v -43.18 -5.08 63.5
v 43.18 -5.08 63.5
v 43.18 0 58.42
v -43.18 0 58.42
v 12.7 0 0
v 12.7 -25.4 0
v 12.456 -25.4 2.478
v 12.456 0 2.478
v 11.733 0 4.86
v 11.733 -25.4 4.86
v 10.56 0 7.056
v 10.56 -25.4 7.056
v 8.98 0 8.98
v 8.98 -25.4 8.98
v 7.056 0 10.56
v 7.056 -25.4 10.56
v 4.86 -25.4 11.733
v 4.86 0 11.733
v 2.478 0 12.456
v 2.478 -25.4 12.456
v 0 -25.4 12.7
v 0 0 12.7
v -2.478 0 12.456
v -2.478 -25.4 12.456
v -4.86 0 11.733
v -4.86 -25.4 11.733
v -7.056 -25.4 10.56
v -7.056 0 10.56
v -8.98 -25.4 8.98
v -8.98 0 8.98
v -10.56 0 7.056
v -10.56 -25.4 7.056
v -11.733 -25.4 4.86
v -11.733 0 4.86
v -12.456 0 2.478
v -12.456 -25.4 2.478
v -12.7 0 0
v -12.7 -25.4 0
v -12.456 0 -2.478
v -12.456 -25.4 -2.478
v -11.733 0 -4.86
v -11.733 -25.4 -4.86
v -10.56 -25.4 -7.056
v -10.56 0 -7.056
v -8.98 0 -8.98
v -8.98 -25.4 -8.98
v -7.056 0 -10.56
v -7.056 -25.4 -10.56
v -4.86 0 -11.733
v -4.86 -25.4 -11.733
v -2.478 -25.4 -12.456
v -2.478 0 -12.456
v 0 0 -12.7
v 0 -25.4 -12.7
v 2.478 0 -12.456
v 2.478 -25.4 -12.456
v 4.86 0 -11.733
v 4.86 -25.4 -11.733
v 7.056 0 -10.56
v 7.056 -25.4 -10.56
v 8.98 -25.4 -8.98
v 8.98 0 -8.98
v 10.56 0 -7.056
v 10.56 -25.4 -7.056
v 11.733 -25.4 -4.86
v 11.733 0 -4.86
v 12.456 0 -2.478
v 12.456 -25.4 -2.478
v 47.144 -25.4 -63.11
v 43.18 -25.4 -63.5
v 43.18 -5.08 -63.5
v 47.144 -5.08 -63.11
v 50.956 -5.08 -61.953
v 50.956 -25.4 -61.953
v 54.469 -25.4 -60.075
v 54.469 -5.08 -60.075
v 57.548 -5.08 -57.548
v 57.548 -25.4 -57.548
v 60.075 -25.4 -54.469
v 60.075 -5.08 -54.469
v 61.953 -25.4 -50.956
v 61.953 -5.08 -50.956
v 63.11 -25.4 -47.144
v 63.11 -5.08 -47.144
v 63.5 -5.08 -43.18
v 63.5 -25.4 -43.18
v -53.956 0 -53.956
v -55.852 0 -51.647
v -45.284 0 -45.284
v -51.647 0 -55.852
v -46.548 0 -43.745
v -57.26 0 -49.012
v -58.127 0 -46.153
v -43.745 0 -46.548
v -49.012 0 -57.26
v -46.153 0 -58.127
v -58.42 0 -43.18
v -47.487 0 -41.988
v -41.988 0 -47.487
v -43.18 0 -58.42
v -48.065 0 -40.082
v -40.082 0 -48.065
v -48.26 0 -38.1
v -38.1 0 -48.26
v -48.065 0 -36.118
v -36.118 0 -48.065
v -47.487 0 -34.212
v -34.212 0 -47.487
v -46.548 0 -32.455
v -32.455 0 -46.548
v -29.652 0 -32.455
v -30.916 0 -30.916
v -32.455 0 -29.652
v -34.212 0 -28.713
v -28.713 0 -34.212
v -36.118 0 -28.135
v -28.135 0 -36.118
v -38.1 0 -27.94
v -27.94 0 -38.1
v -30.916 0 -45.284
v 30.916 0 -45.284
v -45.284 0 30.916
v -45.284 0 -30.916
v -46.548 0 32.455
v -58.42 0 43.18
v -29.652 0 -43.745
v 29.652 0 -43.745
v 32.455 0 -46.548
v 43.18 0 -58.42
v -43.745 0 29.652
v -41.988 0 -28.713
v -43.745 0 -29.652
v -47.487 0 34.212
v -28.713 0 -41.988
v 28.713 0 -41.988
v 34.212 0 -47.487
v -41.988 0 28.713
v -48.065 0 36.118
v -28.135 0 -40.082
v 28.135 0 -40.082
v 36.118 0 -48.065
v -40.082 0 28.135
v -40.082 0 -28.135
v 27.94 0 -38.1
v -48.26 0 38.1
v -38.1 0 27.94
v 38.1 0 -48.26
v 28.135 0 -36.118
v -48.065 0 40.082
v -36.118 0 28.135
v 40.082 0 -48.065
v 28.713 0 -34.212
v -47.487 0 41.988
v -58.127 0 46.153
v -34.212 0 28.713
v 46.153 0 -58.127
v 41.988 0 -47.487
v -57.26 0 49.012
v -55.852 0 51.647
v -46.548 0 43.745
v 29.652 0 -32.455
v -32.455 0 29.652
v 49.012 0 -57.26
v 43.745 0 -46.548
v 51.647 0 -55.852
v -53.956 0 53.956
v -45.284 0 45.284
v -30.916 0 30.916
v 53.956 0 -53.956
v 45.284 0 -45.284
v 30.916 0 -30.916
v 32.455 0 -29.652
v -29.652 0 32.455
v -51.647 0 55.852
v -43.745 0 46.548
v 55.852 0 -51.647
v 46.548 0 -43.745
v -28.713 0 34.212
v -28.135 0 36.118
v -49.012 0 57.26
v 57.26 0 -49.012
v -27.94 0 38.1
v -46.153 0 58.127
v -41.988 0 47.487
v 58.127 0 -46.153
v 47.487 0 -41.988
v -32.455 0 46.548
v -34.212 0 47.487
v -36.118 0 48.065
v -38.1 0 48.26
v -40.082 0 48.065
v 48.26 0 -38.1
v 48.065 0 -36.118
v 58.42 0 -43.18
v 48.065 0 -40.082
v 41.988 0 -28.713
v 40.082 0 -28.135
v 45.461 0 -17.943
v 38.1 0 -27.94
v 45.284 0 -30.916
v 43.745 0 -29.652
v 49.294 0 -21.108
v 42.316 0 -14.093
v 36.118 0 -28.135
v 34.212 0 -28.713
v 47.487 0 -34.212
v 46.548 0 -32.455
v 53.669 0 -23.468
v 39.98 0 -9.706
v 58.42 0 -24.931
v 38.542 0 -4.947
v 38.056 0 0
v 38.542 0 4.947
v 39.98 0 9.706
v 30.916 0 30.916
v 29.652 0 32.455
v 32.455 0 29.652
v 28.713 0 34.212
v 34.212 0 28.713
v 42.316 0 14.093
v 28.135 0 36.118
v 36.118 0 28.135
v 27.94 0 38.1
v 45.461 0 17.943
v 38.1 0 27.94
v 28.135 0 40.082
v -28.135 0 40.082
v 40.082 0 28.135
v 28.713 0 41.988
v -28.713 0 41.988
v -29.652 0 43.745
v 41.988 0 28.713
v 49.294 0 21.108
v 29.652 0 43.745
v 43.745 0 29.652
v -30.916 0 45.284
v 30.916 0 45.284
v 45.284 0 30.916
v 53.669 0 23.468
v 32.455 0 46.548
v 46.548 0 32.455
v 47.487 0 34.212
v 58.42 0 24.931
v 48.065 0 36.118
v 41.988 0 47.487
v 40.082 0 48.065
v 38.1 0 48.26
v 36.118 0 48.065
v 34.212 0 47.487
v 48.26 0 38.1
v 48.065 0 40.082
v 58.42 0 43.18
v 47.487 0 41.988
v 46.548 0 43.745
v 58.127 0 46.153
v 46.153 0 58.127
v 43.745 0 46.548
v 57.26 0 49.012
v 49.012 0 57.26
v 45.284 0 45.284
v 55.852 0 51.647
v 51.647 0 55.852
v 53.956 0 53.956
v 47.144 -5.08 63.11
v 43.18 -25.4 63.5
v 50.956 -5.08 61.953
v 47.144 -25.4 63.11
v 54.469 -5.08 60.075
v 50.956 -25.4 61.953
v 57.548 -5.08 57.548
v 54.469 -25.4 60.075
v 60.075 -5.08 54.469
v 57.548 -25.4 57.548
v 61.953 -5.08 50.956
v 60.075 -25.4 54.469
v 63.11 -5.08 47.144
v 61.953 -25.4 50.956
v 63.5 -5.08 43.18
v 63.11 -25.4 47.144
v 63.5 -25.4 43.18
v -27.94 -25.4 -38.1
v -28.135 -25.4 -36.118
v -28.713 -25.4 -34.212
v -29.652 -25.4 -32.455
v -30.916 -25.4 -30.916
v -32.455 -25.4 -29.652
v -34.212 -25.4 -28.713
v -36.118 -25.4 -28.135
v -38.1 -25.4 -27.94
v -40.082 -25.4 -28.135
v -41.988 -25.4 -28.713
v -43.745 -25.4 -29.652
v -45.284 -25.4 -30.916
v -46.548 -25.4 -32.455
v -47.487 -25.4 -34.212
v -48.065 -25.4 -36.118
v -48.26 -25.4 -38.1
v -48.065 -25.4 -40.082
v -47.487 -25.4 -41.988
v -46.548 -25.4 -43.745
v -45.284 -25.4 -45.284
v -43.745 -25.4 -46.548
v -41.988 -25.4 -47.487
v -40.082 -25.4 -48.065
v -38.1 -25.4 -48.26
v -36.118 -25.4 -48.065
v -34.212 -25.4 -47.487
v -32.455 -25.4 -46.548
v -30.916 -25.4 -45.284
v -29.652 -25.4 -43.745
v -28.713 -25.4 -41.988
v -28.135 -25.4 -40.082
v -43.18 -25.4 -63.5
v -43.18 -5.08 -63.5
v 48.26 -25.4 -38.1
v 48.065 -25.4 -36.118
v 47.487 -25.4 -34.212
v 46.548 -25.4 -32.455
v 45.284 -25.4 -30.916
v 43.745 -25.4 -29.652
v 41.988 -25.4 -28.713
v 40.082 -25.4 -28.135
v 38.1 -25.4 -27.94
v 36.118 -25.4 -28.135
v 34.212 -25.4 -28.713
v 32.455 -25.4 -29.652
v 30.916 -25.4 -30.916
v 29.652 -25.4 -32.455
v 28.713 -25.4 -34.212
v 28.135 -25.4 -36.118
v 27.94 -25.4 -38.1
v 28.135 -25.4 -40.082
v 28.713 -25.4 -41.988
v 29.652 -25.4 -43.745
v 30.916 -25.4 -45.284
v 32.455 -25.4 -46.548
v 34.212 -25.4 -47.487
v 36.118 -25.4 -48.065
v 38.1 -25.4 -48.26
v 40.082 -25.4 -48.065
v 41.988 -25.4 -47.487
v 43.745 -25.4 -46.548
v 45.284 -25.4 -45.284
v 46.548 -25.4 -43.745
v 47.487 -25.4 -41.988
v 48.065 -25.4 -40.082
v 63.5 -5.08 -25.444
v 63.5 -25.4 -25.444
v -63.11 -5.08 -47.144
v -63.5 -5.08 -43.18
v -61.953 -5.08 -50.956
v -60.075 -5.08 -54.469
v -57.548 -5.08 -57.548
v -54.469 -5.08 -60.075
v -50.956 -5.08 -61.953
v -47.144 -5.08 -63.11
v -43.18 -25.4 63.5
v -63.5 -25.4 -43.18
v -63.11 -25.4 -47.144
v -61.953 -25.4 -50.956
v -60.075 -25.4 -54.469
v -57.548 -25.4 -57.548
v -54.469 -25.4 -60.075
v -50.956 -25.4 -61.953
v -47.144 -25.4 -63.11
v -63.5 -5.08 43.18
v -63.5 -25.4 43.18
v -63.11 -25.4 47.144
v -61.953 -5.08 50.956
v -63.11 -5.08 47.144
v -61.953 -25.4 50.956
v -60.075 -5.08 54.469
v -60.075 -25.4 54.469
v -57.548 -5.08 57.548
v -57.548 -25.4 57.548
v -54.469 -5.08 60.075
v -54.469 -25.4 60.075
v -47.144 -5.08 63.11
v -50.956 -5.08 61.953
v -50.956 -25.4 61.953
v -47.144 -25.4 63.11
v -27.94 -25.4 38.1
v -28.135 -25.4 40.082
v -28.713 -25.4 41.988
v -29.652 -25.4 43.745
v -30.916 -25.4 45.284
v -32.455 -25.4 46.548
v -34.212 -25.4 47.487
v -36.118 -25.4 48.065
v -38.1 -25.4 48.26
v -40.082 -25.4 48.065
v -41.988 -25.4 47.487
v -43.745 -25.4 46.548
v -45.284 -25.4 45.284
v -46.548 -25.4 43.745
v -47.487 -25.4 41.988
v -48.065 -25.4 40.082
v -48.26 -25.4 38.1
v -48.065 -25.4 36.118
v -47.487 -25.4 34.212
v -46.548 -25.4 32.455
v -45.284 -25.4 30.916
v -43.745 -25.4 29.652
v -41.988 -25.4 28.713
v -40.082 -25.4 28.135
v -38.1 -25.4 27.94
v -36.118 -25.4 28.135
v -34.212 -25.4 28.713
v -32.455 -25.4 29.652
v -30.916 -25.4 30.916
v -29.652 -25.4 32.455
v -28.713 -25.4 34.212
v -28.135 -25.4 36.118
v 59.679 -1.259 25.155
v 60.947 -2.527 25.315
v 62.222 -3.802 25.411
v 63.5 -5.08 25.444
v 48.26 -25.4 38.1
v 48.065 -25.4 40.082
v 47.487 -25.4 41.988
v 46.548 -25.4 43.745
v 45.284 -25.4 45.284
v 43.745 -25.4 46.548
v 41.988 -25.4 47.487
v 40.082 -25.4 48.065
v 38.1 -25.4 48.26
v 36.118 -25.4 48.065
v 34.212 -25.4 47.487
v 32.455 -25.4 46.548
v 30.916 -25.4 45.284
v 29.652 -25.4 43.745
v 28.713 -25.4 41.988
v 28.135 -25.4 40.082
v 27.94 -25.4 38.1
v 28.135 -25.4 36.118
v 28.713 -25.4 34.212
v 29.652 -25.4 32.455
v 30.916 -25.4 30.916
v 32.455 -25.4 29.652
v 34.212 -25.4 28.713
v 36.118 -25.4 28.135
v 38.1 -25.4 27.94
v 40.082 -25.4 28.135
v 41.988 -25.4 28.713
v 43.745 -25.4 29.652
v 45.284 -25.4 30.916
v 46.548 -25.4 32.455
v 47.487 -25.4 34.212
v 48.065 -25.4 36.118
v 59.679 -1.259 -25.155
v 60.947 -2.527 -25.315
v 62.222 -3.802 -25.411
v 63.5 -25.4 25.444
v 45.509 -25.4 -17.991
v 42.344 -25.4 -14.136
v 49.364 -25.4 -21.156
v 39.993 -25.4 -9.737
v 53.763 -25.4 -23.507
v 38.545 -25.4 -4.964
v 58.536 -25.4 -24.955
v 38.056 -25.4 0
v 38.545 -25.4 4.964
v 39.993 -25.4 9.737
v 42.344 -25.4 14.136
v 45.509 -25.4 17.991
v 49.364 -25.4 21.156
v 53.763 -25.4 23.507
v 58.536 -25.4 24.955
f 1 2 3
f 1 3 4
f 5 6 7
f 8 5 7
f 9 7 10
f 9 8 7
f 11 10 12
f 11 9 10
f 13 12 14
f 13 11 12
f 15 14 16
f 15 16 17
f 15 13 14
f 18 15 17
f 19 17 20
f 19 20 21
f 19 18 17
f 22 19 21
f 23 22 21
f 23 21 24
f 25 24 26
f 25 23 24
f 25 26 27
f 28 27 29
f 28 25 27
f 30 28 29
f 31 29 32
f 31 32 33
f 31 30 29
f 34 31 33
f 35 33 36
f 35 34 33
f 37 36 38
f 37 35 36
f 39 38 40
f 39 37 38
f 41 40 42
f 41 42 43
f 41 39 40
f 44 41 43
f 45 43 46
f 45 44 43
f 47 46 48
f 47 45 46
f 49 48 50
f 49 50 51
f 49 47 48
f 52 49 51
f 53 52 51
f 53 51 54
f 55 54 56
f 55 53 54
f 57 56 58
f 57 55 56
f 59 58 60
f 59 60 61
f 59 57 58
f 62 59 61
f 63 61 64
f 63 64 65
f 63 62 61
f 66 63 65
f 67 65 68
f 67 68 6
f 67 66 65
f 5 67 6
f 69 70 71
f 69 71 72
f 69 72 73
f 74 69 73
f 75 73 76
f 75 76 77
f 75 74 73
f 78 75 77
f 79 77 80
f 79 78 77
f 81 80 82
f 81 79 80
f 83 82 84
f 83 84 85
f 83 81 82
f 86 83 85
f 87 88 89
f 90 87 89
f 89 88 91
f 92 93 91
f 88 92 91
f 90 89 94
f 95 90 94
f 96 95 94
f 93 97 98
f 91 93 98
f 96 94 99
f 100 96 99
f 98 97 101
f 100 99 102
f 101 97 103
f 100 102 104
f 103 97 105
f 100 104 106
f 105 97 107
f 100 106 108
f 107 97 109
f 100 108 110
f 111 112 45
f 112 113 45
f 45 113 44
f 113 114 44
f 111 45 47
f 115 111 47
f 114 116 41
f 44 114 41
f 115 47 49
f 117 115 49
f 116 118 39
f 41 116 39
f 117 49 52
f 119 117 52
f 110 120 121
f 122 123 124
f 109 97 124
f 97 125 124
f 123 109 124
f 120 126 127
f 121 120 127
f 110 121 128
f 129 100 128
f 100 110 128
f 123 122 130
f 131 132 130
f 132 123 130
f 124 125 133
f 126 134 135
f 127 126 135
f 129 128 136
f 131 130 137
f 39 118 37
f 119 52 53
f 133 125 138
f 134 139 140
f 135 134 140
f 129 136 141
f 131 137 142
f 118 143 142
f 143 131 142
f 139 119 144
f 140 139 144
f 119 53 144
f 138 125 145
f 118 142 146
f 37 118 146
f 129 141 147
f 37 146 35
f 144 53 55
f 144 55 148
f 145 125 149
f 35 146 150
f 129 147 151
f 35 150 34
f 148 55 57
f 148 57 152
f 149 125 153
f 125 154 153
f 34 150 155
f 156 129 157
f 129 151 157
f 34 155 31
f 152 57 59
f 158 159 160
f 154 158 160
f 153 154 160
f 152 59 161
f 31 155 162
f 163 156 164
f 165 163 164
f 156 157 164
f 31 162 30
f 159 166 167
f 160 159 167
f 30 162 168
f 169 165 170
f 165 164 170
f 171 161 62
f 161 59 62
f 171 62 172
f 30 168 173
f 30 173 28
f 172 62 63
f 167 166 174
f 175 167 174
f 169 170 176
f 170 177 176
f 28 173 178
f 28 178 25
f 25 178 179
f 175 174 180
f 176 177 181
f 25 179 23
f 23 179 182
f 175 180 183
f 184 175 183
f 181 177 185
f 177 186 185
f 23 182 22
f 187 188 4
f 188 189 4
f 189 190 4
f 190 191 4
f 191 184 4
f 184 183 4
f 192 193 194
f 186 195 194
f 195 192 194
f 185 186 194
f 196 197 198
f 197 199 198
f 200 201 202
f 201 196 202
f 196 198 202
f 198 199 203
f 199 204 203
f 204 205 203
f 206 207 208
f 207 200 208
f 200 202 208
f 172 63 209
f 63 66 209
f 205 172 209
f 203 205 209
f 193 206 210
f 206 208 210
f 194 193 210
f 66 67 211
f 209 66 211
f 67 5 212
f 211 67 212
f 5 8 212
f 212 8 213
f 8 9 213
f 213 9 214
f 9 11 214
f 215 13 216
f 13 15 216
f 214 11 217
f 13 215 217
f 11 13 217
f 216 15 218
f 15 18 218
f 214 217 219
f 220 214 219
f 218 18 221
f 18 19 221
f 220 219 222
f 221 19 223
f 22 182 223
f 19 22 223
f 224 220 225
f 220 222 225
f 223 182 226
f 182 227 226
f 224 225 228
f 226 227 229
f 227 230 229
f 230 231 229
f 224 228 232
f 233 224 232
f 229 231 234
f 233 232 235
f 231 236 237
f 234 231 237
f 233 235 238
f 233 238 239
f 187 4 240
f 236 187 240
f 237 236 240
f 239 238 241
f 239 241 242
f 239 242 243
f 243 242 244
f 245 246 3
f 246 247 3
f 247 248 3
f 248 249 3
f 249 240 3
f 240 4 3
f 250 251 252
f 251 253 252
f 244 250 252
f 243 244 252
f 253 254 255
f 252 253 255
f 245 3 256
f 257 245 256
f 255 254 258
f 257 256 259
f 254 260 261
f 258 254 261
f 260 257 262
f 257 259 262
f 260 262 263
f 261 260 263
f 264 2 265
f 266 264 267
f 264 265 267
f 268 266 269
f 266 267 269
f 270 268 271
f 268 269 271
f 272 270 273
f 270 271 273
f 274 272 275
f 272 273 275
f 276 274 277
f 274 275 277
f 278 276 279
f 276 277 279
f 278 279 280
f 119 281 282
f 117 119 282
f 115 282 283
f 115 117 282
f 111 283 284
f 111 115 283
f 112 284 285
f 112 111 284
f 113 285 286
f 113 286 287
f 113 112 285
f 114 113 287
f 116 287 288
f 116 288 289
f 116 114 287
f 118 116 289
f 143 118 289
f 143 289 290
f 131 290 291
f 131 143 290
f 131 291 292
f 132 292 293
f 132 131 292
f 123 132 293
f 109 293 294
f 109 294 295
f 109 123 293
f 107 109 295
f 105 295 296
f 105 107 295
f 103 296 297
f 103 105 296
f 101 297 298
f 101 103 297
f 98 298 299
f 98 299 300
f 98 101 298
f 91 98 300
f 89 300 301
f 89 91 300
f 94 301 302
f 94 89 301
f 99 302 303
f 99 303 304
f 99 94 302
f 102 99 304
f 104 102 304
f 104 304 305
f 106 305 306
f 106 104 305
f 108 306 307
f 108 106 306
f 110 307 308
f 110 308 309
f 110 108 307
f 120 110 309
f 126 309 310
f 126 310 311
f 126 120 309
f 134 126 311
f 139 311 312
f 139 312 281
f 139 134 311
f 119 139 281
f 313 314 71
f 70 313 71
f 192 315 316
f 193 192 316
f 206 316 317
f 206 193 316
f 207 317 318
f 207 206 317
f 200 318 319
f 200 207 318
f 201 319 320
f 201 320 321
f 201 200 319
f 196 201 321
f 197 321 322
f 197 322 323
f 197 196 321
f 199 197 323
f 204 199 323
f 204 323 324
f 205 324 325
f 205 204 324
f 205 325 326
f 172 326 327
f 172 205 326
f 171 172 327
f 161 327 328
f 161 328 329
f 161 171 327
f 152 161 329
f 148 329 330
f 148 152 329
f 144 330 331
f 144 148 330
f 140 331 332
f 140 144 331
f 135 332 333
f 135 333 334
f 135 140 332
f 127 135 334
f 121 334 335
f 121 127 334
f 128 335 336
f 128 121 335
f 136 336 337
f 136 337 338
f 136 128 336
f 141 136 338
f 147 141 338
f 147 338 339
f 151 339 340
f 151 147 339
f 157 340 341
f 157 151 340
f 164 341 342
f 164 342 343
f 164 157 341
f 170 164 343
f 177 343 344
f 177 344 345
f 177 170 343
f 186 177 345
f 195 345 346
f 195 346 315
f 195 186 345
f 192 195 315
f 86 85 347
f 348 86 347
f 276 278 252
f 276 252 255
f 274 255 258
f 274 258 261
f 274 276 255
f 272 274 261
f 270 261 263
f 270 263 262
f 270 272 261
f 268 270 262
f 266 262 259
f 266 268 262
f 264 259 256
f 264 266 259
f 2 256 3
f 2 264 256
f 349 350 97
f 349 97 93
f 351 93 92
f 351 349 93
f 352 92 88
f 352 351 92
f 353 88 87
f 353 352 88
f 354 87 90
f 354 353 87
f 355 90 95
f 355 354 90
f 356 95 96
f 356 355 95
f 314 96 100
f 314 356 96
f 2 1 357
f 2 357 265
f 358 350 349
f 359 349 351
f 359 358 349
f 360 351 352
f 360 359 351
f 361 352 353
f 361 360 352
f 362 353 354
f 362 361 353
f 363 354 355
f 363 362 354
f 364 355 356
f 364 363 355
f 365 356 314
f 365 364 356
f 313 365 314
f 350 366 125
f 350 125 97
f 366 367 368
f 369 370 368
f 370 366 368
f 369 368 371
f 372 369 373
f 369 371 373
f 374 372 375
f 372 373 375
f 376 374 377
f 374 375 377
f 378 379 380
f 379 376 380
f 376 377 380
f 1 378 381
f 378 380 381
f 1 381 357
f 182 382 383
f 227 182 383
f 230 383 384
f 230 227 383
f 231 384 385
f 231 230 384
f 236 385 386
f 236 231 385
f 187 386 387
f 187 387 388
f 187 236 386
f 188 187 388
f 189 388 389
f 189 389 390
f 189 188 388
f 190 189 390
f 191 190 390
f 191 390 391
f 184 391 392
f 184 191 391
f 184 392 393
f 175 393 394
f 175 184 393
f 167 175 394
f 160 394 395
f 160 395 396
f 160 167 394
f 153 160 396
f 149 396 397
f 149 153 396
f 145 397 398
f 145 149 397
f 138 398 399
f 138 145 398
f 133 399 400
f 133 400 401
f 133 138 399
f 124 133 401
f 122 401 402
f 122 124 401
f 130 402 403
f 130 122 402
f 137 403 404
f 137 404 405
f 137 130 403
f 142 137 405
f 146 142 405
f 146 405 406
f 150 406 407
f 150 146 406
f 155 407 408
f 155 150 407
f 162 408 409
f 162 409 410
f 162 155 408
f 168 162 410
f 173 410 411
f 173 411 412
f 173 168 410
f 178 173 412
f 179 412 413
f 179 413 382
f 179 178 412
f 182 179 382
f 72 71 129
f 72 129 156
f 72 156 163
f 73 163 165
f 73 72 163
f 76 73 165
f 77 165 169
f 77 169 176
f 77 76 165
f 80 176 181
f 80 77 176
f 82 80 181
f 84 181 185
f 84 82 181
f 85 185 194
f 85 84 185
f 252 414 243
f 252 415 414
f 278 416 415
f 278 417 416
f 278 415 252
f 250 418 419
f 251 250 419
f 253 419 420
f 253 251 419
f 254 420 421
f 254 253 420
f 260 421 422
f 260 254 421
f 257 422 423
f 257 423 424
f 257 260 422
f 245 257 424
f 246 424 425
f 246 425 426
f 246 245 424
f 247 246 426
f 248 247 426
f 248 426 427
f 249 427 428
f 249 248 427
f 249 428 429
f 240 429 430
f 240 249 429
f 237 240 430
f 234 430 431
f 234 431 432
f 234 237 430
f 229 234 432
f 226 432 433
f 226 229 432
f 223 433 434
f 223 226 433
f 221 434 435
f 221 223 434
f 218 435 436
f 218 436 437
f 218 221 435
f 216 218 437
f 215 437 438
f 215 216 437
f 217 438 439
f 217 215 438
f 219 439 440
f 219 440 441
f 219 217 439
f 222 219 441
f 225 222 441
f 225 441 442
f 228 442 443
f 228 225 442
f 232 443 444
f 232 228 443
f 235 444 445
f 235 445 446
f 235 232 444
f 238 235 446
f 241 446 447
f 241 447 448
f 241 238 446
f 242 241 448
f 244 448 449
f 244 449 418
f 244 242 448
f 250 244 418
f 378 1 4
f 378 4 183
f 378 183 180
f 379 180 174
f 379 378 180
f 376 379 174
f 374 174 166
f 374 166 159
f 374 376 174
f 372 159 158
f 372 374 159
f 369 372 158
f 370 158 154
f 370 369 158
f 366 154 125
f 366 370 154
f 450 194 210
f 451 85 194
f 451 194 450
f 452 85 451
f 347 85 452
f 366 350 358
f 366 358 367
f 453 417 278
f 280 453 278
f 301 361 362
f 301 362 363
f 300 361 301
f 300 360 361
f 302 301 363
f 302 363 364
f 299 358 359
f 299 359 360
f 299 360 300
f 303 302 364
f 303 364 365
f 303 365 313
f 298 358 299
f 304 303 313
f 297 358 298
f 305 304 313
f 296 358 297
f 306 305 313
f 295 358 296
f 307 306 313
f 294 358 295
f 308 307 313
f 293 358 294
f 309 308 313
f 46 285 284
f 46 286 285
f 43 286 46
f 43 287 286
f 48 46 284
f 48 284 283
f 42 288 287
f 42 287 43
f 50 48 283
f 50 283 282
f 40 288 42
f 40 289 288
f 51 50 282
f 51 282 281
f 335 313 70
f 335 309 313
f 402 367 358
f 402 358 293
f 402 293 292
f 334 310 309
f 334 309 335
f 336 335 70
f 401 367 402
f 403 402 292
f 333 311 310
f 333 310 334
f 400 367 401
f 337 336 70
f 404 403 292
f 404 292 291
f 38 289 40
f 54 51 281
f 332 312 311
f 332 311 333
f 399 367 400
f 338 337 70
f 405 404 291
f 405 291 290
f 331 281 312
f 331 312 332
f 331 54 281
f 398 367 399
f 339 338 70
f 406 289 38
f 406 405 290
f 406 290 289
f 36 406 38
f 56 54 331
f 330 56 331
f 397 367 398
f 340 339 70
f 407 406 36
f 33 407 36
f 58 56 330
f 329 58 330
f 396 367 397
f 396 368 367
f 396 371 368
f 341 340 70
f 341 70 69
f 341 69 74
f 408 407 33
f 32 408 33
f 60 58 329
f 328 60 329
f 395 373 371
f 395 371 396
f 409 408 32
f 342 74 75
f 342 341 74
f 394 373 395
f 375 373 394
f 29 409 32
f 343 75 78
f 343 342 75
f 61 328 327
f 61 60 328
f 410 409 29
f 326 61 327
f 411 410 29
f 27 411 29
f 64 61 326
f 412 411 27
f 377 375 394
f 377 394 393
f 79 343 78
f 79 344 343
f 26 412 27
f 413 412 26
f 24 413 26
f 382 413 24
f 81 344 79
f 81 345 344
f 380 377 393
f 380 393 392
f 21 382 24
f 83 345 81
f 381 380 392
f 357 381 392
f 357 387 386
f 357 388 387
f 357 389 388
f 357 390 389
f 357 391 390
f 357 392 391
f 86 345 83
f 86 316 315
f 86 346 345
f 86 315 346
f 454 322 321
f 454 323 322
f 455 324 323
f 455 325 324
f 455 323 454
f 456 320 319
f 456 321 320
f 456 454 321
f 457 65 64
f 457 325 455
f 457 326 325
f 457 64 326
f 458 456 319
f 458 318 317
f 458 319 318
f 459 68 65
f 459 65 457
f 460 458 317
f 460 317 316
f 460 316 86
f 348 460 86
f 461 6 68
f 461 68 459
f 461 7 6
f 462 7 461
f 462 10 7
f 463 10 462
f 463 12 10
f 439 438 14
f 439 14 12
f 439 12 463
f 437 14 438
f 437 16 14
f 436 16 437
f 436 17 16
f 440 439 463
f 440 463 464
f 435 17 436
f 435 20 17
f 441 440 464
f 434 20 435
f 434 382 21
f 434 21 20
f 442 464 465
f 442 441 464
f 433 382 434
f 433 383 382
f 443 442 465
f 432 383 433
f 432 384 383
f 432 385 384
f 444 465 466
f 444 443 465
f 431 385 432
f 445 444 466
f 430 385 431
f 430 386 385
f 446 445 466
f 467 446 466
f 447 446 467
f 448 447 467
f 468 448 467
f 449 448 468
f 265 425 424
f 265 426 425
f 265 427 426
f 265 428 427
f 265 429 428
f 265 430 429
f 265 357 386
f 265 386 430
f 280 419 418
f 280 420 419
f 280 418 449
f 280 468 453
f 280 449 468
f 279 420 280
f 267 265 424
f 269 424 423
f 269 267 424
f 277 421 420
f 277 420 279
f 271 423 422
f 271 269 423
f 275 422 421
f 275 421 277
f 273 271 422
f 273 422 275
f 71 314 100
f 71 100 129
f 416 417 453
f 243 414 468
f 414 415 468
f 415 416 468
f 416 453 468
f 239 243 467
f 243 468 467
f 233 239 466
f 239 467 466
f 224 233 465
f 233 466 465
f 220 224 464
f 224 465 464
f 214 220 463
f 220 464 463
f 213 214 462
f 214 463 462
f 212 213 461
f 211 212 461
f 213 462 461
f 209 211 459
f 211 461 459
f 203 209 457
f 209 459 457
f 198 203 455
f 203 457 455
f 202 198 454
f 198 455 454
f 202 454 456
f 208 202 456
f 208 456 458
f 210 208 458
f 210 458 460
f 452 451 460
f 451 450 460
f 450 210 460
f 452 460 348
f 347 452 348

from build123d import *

# Parameters (mm, degrees)
F0_W     = 127
F0_H     = 127
F0_R     = 10.16
F0_R_2   = 12.7
F1_DEPTH = 25.4
F2_R     = 20.32
F3_SIZE  = 5.08
F5_DEPTH = 50.8964881301


with BuildPart() as f1:
    # F0 (on Front) → F1 (new body)
    with BuildSketch(Plane.XZ):
        Rectangle(F0_W, F0_H)
        with Locations((-38.1, -38.1)):
            Circle(F0_R, mode=Mode.SUBTRACT)
        with Locations((38.1, -38.1)):
            Circle(F0_R, mode=Mode.SUBTRACT)
        with Locations((-38.1, 38.1)):
            Circle(F0_R, mode=Mode.SUBTRACT)
        Circle(F0_R_2, mode=Mode.SUBTRACT)
        with Locations((38.1, 38.1)):
            Circle(F0_R, mode=Mode.SUBTRACT)
    extrude(amount=F1_DEPTH)

    # F2
    f2_edges = [f1.edges().sort_by_distance(p)[0] for p in [
        (63.5, -12.7, 63.5),
        (-63.5, -12.7, 63.5),
        (63.5, -12.7, -63.5),
        (-63.5, -12.7, -63.5),
    ]]
    fillet(f2_edges, radius=F2_R)

    # F3
    f3_edges = [f1.edges().sort_by_distance(p)[0] for p in [
        (0, 0, -63.5),
    ]]
    chamfer(f3_edges, length=F3_SIZE)

    # F4 (on face) → F5 (cut)
    with BuildSketch(Plane.XZ.offset(25.4)):
        with BuildLine():
            Line((63.5, -25.4435916758), (63.5, 25.4435916758))
            ThreePointArc((63.5, 25.4435916758), (38.0564083242, 0), (63.5, -25.4435916758))
        make_face()
    extrude(amount=-F5_DEPTH, mode=Mode.SUBTRACT)


solid = f1.part
